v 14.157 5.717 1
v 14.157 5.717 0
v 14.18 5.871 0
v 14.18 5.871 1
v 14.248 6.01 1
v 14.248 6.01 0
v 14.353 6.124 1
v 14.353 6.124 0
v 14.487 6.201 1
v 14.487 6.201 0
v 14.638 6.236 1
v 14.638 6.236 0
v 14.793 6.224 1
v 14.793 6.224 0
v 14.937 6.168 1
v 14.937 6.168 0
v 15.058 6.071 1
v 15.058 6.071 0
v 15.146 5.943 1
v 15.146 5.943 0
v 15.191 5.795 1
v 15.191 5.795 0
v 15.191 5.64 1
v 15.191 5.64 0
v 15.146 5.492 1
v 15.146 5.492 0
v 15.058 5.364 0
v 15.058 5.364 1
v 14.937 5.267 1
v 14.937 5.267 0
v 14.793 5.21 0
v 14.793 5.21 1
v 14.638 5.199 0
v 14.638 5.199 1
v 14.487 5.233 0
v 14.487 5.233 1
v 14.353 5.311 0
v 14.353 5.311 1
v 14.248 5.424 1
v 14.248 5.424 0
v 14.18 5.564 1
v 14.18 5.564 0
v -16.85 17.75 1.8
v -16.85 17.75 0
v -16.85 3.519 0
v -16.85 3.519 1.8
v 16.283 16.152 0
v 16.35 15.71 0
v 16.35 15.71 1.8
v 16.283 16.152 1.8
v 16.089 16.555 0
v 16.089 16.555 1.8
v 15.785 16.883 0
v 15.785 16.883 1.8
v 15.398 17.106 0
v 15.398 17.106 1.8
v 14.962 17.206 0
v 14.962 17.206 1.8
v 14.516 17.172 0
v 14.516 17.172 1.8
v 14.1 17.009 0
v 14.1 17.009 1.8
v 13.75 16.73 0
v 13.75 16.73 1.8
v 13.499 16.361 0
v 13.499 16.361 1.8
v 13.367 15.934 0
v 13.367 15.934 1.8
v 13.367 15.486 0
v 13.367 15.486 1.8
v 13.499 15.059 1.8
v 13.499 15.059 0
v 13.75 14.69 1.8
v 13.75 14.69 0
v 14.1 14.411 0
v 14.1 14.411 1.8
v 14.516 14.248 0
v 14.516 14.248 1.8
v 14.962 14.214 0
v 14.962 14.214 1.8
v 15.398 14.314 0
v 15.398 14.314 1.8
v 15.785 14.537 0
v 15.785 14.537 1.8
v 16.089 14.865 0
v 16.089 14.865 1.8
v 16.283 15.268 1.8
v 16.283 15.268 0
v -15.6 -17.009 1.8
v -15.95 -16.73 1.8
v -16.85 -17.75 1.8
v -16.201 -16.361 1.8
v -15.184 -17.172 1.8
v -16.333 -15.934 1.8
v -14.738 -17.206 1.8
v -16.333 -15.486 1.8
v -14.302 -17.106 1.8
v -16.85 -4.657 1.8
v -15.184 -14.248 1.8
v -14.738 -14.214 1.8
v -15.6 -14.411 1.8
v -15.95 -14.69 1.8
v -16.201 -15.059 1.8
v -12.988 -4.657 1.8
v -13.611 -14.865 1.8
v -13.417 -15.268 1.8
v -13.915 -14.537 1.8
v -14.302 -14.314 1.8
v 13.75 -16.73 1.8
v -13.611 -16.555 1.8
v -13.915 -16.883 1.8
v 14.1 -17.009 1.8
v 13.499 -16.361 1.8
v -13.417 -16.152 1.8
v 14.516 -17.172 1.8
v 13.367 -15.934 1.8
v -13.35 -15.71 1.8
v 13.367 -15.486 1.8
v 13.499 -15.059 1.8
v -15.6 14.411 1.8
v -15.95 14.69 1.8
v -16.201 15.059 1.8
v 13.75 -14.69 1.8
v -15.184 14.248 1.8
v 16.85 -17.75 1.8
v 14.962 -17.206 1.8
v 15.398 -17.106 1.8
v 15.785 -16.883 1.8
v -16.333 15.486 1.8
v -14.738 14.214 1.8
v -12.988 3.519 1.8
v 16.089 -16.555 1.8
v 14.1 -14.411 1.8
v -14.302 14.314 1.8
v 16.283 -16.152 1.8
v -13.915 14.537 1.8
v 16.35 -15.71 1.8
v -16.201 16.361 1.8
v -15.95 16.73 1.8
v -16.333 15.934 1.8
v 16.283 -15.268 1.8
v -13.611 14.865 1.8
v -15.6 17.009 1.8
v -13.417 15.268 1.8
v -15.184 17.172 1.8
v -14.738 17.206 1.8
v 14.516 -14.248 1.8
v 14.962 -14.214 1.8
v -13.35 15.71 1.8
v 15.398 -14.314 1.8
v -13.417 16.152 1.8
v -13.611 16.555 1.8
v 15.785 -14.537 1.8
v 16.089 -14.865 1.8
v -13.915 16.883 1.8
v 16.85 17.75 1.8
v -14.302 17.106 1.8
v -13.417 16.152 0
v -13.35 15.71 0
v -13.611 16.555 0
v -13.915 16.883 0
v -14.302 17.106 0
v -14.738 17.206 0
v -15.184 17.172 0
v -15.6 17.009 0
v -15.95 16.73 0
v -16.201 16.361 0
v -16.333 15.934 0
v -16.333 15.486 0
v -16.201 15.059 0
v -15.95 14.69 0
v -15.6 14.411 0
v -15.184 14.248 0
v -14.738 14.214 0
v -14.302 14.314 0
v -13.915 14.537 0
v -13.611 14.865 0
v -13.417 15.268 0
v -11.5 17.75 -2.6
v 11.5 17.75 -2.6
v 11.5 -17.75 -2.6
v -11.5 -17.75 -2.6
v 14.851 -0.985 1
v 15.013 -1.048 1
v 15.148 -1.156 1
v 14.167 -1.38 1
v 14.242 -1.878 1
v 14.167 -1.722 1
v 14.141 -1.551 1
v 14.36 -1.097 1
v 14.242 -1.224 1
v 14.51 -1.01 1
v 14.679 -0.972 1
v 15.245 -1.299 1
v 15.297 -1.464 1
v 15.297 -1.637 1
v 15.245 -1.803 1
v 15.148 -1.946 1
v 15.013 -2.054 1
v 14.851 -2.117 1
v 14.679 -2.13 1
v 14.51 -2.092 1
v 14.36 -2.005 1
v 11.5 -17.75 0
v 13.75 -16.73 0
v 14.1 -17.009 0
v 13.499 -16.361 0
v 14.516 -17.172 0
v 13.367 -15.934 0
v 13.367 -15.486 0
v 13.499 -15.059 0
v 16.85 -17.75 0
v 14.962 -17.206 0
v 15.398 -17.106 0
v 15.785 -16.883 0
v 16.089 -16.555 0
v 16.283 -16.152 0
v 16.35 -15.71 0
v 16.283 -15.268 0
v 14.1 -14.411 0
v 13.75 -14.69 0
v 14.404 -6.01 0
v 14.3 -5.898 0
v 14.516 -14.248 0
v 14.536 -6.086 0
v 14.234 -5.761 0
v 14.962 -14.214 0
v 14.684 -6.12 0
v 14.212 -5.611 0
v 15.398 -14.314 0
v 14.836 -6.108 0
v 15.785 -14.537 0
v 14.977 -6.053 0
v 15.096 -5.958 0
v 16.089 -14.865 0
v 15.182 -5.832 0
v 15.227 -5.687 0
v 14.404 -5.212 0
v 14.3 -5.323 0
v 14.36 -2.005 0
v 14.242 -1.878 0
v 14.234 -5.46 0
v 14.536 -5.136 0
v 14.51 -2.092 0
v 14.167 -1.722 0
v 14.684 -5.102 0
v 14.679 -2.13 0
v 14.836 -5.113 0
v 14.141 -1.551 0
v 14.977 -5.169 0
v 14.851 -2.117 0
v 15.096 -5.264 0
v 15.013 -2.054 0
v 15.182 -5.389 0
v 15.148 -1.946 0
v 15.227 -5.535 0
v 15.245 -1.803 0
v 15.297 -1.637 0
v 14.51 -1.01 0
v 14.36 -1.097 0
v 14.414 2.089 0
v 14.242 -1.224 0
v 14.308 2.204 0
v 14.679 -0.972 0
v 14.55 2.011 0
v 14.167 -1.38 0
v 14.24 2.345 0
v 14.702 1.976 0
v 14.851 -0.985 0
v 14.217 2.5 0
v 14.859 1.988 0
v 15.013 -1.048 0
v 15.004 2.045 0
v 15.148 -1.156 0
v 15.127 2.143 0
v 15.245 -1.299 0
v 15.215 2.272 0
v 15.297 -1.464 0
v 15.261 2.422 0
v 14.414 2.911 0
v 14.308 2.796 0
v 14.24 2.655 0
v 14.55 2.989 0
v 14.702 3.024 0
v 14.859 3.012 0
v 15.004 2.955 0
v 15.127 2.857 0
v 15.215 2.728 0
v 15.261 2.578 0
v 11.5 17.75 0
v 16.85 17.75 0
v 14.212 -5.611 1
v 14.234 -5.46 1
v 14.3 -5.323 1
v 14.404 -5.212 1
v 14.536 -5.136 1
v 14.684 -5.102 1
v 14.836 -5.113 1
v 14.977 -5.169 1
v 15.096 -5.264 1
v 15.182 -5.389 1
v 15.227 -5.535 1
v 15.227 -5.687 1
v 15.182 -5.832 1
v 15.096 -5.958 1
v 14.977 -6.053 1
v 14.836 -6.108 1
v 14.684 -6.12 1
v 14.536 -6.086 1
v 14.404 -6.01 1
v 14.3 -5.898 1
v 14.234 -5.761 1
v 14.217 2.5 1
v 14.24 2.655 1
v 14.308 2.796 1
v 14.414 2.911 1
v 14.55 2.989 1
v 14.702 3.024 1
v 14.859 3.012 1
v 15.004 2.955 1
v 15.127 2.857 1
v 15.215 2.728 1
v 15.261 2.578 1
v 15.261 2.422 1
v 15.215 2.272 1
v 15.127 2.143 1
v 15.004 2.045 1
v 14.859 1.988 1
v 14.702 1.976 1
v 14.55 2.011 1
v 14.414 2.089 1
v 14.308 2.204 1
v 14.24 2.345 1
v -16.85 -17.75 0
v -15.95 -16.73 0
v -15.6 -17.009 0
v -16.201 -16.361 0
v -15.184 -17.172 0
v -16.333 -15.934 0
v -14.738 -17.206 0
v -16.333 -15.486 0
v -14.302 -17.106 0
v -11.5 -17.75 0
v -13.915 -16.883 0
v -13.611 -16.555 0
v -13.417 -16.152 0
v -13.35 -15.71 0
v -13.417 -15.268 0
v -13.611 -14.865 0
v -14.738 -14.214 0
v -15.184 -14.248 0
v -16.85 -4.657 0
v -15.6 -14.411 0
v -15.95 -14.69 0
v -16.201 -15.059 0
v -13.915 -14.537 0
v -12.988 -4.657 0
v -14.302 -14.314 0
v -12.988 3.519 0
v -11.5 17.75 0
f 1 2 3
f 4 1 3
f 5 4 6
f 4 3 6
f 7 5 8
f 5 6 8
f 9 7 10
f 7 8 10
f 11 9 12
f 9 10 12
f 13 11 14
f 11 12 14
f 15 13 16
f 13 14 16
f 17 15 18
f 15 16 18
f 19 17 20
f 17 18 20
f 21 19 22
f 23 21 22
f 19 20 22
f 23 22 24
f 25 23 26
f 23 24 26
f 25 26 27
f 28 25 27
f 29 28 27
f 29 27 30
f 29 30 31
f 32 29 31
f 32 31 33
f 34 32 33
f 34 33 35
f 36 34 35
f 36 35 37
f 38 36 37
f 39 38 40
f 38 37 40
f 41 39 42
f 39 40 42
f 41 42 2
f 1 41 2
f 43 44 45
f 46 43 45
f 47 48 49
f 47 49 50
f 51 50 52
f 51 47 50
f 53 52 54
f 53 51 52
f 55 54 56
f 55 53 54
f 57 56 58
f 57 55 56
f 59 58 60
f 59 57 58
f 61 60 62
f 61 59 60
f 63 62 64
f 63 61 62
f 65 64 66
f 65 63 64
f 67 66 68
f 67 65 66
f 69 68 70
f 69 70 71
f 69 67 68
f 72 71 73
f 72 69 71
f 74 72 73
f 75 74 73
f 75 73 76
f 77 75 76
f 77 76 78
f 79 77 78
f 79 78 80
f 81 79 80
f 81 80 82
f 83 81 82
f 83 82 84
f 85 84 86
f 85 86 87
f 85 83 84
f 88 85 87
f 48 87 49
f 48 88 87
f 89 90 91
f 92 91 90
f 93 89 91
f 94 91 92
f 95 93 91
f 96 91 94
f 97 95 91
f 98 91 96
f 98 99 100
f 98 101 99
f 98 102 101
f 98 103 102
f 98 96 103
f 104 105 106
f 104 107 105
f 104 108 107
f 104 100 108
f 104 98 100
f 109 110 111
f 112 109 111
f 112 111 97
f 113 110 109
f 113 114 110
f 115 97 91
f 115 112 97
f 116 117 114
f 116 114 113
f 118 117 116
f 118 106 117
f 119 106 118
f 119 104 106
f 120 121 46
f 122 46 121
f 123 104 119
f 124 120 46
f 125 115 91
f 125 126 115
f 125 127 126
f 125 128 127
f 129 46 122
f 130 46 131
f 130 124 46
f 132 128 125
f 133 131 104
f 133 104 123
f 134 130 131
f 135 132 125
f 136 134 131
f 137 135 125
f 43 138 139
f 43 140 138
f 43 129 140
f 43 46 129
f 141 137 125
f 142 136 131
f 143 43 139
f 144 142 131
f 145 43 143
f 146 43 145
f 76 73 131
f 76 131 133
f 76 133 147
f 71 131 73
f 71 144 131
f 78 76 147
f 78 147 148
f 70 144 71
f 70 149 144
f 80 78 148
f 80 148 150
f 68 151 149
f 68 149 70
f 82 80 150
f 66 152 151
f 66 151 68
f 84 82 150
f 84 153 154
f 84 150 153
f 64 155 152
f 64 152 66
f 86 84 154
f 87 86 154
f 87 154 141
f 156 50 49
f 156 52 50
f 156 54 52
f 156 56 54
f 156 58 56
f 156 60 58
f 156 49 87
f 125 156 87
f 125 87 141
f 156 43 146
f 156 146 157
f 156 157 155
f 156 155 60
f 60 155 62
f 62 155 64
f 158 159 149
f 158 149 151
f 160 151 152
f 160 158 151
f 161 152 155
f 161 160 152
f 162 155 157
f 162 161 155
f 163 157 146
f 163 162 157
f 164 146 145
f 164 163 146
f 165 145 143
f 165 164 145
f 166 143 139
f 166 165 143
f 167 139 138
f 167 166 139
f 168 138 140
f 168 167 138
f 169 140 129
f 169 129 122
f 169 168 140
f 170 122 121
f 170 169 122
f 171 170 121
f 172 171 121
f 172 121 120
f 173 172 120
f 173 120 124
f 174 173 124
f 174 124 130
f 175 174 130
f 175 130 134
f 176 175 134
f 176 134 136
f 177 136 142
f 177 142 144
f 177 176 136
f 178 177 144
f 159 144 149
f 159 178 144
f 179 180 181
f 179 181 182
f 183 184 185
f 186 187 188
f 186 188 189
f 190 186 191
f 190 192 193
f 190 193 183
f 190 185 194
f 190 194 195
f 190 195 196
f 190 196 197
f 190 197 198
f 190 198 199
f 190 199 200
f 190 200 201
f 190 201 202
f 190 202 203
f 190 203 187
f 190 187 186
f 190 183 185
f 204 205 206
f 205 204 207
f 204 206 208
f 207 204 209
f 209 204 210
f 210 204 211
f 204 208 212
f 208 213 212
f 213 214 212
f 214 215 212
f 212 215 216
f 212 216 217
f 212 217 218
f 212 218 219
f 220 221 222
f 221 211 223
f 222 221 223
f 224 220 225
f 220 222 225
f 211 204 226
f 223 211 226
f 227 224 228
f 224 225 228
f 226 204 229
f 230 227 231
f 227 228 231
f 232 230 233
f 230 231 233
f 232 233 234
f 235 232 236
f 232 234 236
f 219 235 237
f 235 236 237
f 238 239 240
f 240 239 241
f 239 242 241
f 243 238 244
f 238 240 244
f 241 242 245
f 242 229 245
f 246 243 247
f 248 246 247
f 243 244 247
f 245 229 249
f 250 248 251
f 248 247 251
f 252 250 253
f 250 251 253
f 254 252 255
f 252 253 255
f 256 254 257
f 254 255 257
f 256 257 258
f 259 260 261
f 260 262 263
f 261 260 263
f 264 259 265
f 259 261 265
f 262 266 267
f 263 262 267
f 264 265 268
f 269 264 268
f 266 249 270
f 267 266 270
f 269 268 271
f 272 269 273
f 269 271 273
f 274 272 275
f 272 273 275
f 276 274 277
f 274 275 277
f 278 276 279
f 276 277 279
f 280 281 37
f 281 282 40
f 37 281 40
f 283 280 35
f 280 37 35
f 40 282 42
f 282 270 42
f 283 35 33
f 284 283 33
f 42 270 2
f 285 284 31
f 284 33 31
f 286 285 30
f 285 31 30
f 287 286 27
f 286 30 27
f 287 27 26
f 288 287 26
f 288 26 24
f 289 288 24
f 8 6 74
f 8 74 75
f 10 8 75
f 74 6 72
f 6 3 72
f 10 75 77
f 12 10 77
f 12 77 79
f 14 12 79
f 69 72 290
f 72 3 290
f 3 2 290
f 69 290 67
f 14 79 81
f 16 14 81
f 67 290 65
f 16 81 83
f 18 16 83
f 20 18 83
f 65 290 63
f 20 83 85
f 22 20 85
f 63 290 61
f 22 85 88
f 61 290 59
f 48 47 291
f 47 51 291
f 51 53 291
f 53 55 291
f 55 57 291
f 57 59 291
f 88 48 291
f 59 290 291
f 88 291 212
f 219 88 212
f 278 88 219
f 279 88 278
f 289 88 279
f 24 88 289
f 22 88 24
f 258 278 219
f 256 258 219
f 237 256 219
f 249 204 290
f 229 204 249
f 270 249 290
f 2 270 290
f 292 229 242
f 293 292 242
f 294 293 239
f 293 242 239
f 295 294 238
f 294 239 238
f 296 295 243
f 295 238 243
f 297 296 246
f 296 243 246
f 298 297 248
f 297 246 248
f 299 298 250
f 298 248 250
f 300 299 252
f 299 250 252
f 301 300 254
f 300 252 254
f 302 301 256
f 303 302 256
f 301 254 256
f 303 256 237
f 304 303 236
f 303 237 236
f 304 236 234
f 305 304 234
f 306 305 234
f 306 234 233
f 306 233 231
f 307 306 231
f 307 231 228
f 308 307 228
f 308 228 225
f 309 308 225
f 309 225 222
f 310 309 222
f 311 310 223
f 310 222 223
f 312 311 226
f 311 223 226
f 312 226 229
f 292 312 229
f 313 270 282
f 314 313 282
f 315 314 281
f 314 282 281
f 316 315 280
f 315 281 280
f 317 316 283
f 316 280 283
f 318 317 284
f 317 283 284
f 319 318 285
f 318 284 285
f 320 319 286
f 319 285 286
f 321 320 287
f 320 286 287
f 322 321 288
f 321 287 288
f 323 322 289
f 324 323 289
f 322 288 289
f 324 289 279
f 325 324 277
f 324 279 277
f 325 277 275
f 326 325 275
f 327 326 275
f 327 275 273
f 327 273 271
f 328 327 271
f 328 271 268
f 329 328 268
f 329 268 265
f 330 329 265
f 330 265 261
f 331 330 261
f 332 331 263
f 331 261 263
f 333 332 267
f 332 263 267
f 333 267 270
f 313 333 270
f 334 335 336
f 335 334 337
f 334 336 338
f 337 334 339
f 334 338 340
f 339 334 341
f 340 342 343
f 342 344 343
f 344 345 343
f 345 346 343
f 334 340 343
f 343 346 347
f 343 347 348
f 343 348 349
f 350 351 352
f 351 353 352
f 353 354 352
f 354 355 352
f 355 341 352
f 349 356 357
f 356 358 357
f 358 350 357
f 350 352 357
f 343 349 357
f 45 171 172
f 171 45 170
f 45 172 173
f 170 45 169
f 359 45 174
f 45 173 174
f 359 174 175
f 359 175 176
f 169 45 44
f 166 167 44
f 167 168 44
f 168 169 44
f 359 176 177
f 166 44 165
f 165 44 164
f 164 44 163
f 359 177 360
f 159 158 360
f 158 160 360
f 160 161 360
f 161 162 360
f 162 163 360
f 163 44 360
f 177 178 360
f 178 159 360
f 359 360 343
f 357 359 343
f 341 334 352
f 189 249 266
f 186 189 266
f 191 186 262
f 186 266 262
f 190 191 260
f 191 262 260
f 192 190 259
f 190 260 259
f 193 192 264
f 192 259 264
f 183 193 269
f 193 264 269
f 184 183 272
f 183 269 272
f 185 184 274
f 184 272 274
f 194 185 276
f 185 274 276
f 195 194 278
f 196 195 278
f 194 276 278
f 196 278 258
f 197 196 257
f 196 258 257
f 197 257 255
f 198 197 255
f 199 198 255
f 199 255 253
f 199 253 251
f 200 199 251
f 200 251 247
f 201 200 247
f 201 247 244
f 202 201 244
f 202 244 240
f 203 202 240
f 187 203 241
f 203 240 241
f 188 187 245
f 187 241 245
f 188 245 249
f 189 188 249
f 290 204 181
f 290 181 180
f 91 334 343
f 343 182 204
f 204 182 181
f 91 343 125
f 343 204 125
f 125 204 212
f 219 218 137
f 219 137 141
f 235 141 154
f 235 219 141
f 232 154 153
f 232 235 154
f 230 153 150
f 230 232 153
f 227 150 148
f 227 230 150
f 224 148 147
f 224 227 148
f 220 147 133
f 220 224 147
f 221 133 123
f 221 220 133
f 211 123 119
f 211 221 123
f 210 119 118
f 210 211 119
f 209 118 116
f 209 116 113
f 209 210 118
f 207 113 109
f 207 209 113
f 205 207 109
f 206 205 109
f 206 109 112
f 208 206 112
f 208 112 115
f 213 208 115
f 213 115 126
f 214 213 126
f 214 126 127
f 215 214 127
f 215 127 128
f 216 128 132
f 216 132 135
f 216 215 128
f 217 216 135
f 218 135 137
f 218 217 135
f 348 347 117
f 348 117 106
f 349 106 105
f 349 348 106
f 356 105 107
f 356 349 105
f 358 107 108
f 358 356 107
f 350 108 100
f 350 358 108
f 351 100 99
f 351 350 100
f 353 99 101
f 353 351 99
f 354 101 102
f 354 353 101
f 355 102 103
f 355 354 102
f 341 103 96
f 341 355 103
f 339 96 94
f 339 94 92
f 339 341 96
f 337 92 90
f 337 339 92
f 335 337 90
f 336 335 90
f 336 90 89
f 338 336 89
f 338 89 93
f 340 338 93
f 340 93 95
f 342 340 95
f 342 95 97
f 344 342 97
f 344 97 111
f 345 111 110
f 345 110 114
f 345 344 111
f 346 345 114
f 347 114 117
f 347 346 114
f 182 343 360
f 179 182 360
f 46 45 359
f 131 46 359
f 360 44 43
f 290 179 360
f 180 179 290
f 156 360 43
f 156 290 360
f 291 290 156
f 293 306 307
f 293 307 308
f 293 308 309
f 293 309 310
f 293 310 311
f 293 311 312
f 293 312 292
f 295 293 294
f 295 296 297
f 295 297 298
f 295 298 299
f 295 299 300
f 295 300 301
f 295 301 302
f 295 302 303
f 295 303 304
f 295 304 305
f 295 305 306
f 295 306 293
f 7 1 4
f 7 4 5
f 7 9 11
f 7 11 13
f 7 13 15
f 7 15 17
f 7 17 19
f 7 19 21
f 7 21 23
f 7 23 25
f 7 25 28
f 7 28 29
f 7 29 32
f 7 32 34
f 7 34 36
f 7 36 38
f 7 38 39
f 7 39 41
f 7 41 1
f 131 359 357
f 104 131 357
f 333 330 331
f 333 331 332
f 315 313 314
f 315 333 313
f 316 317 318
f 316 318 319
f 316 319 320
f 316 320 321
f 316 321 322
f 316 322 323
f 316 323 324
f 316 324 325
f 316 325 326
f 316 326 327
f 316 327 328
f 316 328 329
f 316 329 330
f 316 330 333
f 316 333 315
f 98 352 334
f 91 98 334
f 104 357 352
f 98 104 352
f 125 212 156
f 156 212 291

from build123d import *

# Parameters (mm, degrees)
SKETCH1_W           = 14.7
SKETCH1_H           = 29.42
SKETCH1_R           = 1.5
SKETCH1_W_2         = 23
SKETCH1_H_2         = 35.5
BOSS_EXTRUDE5_DEPTH = 1.8
SKETCH2_W           = 23
SKETCH2_H           = 35.5
BOSS_EXTRUDE7_DEPTH = 2.6
SKETCH3_R           = 0.510447256
SKETCH3_R_2         = 0.580916902
SKETCH3_R_3         = 0.525090018
CUT_EXTRUDE1_DEPTH  = 1
SKETCH5_R           = 0.520017215
CUT_EXTRUDE5_DEPTH  = 1


with BuildPart() as part:
    # Sketch1 → Boss-Extrude5 (new body)
    # profile 1 of 3: a face of its own
    with BuildSketch(Plane.XY):
        Rectangle(SKETCH1_W, SKETCH1_H)
    # profile 2 of 3: a face of its own
    with BuildSketch(Plane.XY):
        Polygon((16.85, 17.75), (-16.85, 17.75), (-16.85, 3.519072364), (-12.987679058, 3.519072364), (-12.987679058, -4.65716191), (-16.85, -4.65716191), (-16.85, -17.75), (16.85, -17.75), align=None)
        with Locations((14.85, -15.71)):
            Circle(SKETCH1_R, mode=Mode.SUBTRACT)
        with Locations((14.85, 15.71)):
            Circle(SKETCH1_R, mode=Mode.SUBTRACT)
        with Locations((-14.85, 15.71)):
            Circle(SKETCH1_R, mode=Mode.SUBTRACT)
        with Locations((-14.85, -15.71)):
            Circle(SKETCH1_R, mode=Mode.SUBTRACT)
    # profile 3 of 3: a face of its own
    with BuildSketch(Plane.XY):
        Rectangle(SKETCH1_W_2, SKETCH1_H_2)
    extrude(amount=BOSS_EXTRUDE5_DEPTH)

    # Sketch2 → Boss-Extrude7 (add)
    with BuildSketch(Plane(origin=(0, 0, 0), x_dir=(-1, 0, 0), z_dir=(0, 0, -1))):
        Rectangle(SKETCH2_W, SKETCH2_H)
    extrude(amount=BOSS_EXTRUDE7_DEPTH)

    # Sketch3 → Cut-Extrude1 (cut)
    with BuildSketch(Plane(origin=(0, 0, 0), x_dir=(-1, 0, 0), z_dir=(0, 0, -1))):
        with Locations((-14.722097133, -5.610781363)):
            Circle(SKETCH3_R)
        with Locations((-14.722097133, -1.550914358)):
            Circle(SKETCH3_R_2)
        with Locations((-14.741724546, 2.500014567)):
            Circle(SKETCH3_R_3)
    extrude(amount=-CUT_EXTRUDE1_DEPTH, mode=Mode.SUBTRACT)

    # Sketch5 → Cut-Extrude5 (cut)
    with BuildSketch(Plane(origin=(0, 0, 0), x_dir=(-1, 0, 0), z_dir=(0, 0, -1))):
        with Locations((-14.677272087, 5.717301692)):
            Circle(SKETCH5_R)
    extrude(amount=-CUT_EXTRUDE5_DEPTH, mode=Mode.SUBTRACT)


solid = part.part
